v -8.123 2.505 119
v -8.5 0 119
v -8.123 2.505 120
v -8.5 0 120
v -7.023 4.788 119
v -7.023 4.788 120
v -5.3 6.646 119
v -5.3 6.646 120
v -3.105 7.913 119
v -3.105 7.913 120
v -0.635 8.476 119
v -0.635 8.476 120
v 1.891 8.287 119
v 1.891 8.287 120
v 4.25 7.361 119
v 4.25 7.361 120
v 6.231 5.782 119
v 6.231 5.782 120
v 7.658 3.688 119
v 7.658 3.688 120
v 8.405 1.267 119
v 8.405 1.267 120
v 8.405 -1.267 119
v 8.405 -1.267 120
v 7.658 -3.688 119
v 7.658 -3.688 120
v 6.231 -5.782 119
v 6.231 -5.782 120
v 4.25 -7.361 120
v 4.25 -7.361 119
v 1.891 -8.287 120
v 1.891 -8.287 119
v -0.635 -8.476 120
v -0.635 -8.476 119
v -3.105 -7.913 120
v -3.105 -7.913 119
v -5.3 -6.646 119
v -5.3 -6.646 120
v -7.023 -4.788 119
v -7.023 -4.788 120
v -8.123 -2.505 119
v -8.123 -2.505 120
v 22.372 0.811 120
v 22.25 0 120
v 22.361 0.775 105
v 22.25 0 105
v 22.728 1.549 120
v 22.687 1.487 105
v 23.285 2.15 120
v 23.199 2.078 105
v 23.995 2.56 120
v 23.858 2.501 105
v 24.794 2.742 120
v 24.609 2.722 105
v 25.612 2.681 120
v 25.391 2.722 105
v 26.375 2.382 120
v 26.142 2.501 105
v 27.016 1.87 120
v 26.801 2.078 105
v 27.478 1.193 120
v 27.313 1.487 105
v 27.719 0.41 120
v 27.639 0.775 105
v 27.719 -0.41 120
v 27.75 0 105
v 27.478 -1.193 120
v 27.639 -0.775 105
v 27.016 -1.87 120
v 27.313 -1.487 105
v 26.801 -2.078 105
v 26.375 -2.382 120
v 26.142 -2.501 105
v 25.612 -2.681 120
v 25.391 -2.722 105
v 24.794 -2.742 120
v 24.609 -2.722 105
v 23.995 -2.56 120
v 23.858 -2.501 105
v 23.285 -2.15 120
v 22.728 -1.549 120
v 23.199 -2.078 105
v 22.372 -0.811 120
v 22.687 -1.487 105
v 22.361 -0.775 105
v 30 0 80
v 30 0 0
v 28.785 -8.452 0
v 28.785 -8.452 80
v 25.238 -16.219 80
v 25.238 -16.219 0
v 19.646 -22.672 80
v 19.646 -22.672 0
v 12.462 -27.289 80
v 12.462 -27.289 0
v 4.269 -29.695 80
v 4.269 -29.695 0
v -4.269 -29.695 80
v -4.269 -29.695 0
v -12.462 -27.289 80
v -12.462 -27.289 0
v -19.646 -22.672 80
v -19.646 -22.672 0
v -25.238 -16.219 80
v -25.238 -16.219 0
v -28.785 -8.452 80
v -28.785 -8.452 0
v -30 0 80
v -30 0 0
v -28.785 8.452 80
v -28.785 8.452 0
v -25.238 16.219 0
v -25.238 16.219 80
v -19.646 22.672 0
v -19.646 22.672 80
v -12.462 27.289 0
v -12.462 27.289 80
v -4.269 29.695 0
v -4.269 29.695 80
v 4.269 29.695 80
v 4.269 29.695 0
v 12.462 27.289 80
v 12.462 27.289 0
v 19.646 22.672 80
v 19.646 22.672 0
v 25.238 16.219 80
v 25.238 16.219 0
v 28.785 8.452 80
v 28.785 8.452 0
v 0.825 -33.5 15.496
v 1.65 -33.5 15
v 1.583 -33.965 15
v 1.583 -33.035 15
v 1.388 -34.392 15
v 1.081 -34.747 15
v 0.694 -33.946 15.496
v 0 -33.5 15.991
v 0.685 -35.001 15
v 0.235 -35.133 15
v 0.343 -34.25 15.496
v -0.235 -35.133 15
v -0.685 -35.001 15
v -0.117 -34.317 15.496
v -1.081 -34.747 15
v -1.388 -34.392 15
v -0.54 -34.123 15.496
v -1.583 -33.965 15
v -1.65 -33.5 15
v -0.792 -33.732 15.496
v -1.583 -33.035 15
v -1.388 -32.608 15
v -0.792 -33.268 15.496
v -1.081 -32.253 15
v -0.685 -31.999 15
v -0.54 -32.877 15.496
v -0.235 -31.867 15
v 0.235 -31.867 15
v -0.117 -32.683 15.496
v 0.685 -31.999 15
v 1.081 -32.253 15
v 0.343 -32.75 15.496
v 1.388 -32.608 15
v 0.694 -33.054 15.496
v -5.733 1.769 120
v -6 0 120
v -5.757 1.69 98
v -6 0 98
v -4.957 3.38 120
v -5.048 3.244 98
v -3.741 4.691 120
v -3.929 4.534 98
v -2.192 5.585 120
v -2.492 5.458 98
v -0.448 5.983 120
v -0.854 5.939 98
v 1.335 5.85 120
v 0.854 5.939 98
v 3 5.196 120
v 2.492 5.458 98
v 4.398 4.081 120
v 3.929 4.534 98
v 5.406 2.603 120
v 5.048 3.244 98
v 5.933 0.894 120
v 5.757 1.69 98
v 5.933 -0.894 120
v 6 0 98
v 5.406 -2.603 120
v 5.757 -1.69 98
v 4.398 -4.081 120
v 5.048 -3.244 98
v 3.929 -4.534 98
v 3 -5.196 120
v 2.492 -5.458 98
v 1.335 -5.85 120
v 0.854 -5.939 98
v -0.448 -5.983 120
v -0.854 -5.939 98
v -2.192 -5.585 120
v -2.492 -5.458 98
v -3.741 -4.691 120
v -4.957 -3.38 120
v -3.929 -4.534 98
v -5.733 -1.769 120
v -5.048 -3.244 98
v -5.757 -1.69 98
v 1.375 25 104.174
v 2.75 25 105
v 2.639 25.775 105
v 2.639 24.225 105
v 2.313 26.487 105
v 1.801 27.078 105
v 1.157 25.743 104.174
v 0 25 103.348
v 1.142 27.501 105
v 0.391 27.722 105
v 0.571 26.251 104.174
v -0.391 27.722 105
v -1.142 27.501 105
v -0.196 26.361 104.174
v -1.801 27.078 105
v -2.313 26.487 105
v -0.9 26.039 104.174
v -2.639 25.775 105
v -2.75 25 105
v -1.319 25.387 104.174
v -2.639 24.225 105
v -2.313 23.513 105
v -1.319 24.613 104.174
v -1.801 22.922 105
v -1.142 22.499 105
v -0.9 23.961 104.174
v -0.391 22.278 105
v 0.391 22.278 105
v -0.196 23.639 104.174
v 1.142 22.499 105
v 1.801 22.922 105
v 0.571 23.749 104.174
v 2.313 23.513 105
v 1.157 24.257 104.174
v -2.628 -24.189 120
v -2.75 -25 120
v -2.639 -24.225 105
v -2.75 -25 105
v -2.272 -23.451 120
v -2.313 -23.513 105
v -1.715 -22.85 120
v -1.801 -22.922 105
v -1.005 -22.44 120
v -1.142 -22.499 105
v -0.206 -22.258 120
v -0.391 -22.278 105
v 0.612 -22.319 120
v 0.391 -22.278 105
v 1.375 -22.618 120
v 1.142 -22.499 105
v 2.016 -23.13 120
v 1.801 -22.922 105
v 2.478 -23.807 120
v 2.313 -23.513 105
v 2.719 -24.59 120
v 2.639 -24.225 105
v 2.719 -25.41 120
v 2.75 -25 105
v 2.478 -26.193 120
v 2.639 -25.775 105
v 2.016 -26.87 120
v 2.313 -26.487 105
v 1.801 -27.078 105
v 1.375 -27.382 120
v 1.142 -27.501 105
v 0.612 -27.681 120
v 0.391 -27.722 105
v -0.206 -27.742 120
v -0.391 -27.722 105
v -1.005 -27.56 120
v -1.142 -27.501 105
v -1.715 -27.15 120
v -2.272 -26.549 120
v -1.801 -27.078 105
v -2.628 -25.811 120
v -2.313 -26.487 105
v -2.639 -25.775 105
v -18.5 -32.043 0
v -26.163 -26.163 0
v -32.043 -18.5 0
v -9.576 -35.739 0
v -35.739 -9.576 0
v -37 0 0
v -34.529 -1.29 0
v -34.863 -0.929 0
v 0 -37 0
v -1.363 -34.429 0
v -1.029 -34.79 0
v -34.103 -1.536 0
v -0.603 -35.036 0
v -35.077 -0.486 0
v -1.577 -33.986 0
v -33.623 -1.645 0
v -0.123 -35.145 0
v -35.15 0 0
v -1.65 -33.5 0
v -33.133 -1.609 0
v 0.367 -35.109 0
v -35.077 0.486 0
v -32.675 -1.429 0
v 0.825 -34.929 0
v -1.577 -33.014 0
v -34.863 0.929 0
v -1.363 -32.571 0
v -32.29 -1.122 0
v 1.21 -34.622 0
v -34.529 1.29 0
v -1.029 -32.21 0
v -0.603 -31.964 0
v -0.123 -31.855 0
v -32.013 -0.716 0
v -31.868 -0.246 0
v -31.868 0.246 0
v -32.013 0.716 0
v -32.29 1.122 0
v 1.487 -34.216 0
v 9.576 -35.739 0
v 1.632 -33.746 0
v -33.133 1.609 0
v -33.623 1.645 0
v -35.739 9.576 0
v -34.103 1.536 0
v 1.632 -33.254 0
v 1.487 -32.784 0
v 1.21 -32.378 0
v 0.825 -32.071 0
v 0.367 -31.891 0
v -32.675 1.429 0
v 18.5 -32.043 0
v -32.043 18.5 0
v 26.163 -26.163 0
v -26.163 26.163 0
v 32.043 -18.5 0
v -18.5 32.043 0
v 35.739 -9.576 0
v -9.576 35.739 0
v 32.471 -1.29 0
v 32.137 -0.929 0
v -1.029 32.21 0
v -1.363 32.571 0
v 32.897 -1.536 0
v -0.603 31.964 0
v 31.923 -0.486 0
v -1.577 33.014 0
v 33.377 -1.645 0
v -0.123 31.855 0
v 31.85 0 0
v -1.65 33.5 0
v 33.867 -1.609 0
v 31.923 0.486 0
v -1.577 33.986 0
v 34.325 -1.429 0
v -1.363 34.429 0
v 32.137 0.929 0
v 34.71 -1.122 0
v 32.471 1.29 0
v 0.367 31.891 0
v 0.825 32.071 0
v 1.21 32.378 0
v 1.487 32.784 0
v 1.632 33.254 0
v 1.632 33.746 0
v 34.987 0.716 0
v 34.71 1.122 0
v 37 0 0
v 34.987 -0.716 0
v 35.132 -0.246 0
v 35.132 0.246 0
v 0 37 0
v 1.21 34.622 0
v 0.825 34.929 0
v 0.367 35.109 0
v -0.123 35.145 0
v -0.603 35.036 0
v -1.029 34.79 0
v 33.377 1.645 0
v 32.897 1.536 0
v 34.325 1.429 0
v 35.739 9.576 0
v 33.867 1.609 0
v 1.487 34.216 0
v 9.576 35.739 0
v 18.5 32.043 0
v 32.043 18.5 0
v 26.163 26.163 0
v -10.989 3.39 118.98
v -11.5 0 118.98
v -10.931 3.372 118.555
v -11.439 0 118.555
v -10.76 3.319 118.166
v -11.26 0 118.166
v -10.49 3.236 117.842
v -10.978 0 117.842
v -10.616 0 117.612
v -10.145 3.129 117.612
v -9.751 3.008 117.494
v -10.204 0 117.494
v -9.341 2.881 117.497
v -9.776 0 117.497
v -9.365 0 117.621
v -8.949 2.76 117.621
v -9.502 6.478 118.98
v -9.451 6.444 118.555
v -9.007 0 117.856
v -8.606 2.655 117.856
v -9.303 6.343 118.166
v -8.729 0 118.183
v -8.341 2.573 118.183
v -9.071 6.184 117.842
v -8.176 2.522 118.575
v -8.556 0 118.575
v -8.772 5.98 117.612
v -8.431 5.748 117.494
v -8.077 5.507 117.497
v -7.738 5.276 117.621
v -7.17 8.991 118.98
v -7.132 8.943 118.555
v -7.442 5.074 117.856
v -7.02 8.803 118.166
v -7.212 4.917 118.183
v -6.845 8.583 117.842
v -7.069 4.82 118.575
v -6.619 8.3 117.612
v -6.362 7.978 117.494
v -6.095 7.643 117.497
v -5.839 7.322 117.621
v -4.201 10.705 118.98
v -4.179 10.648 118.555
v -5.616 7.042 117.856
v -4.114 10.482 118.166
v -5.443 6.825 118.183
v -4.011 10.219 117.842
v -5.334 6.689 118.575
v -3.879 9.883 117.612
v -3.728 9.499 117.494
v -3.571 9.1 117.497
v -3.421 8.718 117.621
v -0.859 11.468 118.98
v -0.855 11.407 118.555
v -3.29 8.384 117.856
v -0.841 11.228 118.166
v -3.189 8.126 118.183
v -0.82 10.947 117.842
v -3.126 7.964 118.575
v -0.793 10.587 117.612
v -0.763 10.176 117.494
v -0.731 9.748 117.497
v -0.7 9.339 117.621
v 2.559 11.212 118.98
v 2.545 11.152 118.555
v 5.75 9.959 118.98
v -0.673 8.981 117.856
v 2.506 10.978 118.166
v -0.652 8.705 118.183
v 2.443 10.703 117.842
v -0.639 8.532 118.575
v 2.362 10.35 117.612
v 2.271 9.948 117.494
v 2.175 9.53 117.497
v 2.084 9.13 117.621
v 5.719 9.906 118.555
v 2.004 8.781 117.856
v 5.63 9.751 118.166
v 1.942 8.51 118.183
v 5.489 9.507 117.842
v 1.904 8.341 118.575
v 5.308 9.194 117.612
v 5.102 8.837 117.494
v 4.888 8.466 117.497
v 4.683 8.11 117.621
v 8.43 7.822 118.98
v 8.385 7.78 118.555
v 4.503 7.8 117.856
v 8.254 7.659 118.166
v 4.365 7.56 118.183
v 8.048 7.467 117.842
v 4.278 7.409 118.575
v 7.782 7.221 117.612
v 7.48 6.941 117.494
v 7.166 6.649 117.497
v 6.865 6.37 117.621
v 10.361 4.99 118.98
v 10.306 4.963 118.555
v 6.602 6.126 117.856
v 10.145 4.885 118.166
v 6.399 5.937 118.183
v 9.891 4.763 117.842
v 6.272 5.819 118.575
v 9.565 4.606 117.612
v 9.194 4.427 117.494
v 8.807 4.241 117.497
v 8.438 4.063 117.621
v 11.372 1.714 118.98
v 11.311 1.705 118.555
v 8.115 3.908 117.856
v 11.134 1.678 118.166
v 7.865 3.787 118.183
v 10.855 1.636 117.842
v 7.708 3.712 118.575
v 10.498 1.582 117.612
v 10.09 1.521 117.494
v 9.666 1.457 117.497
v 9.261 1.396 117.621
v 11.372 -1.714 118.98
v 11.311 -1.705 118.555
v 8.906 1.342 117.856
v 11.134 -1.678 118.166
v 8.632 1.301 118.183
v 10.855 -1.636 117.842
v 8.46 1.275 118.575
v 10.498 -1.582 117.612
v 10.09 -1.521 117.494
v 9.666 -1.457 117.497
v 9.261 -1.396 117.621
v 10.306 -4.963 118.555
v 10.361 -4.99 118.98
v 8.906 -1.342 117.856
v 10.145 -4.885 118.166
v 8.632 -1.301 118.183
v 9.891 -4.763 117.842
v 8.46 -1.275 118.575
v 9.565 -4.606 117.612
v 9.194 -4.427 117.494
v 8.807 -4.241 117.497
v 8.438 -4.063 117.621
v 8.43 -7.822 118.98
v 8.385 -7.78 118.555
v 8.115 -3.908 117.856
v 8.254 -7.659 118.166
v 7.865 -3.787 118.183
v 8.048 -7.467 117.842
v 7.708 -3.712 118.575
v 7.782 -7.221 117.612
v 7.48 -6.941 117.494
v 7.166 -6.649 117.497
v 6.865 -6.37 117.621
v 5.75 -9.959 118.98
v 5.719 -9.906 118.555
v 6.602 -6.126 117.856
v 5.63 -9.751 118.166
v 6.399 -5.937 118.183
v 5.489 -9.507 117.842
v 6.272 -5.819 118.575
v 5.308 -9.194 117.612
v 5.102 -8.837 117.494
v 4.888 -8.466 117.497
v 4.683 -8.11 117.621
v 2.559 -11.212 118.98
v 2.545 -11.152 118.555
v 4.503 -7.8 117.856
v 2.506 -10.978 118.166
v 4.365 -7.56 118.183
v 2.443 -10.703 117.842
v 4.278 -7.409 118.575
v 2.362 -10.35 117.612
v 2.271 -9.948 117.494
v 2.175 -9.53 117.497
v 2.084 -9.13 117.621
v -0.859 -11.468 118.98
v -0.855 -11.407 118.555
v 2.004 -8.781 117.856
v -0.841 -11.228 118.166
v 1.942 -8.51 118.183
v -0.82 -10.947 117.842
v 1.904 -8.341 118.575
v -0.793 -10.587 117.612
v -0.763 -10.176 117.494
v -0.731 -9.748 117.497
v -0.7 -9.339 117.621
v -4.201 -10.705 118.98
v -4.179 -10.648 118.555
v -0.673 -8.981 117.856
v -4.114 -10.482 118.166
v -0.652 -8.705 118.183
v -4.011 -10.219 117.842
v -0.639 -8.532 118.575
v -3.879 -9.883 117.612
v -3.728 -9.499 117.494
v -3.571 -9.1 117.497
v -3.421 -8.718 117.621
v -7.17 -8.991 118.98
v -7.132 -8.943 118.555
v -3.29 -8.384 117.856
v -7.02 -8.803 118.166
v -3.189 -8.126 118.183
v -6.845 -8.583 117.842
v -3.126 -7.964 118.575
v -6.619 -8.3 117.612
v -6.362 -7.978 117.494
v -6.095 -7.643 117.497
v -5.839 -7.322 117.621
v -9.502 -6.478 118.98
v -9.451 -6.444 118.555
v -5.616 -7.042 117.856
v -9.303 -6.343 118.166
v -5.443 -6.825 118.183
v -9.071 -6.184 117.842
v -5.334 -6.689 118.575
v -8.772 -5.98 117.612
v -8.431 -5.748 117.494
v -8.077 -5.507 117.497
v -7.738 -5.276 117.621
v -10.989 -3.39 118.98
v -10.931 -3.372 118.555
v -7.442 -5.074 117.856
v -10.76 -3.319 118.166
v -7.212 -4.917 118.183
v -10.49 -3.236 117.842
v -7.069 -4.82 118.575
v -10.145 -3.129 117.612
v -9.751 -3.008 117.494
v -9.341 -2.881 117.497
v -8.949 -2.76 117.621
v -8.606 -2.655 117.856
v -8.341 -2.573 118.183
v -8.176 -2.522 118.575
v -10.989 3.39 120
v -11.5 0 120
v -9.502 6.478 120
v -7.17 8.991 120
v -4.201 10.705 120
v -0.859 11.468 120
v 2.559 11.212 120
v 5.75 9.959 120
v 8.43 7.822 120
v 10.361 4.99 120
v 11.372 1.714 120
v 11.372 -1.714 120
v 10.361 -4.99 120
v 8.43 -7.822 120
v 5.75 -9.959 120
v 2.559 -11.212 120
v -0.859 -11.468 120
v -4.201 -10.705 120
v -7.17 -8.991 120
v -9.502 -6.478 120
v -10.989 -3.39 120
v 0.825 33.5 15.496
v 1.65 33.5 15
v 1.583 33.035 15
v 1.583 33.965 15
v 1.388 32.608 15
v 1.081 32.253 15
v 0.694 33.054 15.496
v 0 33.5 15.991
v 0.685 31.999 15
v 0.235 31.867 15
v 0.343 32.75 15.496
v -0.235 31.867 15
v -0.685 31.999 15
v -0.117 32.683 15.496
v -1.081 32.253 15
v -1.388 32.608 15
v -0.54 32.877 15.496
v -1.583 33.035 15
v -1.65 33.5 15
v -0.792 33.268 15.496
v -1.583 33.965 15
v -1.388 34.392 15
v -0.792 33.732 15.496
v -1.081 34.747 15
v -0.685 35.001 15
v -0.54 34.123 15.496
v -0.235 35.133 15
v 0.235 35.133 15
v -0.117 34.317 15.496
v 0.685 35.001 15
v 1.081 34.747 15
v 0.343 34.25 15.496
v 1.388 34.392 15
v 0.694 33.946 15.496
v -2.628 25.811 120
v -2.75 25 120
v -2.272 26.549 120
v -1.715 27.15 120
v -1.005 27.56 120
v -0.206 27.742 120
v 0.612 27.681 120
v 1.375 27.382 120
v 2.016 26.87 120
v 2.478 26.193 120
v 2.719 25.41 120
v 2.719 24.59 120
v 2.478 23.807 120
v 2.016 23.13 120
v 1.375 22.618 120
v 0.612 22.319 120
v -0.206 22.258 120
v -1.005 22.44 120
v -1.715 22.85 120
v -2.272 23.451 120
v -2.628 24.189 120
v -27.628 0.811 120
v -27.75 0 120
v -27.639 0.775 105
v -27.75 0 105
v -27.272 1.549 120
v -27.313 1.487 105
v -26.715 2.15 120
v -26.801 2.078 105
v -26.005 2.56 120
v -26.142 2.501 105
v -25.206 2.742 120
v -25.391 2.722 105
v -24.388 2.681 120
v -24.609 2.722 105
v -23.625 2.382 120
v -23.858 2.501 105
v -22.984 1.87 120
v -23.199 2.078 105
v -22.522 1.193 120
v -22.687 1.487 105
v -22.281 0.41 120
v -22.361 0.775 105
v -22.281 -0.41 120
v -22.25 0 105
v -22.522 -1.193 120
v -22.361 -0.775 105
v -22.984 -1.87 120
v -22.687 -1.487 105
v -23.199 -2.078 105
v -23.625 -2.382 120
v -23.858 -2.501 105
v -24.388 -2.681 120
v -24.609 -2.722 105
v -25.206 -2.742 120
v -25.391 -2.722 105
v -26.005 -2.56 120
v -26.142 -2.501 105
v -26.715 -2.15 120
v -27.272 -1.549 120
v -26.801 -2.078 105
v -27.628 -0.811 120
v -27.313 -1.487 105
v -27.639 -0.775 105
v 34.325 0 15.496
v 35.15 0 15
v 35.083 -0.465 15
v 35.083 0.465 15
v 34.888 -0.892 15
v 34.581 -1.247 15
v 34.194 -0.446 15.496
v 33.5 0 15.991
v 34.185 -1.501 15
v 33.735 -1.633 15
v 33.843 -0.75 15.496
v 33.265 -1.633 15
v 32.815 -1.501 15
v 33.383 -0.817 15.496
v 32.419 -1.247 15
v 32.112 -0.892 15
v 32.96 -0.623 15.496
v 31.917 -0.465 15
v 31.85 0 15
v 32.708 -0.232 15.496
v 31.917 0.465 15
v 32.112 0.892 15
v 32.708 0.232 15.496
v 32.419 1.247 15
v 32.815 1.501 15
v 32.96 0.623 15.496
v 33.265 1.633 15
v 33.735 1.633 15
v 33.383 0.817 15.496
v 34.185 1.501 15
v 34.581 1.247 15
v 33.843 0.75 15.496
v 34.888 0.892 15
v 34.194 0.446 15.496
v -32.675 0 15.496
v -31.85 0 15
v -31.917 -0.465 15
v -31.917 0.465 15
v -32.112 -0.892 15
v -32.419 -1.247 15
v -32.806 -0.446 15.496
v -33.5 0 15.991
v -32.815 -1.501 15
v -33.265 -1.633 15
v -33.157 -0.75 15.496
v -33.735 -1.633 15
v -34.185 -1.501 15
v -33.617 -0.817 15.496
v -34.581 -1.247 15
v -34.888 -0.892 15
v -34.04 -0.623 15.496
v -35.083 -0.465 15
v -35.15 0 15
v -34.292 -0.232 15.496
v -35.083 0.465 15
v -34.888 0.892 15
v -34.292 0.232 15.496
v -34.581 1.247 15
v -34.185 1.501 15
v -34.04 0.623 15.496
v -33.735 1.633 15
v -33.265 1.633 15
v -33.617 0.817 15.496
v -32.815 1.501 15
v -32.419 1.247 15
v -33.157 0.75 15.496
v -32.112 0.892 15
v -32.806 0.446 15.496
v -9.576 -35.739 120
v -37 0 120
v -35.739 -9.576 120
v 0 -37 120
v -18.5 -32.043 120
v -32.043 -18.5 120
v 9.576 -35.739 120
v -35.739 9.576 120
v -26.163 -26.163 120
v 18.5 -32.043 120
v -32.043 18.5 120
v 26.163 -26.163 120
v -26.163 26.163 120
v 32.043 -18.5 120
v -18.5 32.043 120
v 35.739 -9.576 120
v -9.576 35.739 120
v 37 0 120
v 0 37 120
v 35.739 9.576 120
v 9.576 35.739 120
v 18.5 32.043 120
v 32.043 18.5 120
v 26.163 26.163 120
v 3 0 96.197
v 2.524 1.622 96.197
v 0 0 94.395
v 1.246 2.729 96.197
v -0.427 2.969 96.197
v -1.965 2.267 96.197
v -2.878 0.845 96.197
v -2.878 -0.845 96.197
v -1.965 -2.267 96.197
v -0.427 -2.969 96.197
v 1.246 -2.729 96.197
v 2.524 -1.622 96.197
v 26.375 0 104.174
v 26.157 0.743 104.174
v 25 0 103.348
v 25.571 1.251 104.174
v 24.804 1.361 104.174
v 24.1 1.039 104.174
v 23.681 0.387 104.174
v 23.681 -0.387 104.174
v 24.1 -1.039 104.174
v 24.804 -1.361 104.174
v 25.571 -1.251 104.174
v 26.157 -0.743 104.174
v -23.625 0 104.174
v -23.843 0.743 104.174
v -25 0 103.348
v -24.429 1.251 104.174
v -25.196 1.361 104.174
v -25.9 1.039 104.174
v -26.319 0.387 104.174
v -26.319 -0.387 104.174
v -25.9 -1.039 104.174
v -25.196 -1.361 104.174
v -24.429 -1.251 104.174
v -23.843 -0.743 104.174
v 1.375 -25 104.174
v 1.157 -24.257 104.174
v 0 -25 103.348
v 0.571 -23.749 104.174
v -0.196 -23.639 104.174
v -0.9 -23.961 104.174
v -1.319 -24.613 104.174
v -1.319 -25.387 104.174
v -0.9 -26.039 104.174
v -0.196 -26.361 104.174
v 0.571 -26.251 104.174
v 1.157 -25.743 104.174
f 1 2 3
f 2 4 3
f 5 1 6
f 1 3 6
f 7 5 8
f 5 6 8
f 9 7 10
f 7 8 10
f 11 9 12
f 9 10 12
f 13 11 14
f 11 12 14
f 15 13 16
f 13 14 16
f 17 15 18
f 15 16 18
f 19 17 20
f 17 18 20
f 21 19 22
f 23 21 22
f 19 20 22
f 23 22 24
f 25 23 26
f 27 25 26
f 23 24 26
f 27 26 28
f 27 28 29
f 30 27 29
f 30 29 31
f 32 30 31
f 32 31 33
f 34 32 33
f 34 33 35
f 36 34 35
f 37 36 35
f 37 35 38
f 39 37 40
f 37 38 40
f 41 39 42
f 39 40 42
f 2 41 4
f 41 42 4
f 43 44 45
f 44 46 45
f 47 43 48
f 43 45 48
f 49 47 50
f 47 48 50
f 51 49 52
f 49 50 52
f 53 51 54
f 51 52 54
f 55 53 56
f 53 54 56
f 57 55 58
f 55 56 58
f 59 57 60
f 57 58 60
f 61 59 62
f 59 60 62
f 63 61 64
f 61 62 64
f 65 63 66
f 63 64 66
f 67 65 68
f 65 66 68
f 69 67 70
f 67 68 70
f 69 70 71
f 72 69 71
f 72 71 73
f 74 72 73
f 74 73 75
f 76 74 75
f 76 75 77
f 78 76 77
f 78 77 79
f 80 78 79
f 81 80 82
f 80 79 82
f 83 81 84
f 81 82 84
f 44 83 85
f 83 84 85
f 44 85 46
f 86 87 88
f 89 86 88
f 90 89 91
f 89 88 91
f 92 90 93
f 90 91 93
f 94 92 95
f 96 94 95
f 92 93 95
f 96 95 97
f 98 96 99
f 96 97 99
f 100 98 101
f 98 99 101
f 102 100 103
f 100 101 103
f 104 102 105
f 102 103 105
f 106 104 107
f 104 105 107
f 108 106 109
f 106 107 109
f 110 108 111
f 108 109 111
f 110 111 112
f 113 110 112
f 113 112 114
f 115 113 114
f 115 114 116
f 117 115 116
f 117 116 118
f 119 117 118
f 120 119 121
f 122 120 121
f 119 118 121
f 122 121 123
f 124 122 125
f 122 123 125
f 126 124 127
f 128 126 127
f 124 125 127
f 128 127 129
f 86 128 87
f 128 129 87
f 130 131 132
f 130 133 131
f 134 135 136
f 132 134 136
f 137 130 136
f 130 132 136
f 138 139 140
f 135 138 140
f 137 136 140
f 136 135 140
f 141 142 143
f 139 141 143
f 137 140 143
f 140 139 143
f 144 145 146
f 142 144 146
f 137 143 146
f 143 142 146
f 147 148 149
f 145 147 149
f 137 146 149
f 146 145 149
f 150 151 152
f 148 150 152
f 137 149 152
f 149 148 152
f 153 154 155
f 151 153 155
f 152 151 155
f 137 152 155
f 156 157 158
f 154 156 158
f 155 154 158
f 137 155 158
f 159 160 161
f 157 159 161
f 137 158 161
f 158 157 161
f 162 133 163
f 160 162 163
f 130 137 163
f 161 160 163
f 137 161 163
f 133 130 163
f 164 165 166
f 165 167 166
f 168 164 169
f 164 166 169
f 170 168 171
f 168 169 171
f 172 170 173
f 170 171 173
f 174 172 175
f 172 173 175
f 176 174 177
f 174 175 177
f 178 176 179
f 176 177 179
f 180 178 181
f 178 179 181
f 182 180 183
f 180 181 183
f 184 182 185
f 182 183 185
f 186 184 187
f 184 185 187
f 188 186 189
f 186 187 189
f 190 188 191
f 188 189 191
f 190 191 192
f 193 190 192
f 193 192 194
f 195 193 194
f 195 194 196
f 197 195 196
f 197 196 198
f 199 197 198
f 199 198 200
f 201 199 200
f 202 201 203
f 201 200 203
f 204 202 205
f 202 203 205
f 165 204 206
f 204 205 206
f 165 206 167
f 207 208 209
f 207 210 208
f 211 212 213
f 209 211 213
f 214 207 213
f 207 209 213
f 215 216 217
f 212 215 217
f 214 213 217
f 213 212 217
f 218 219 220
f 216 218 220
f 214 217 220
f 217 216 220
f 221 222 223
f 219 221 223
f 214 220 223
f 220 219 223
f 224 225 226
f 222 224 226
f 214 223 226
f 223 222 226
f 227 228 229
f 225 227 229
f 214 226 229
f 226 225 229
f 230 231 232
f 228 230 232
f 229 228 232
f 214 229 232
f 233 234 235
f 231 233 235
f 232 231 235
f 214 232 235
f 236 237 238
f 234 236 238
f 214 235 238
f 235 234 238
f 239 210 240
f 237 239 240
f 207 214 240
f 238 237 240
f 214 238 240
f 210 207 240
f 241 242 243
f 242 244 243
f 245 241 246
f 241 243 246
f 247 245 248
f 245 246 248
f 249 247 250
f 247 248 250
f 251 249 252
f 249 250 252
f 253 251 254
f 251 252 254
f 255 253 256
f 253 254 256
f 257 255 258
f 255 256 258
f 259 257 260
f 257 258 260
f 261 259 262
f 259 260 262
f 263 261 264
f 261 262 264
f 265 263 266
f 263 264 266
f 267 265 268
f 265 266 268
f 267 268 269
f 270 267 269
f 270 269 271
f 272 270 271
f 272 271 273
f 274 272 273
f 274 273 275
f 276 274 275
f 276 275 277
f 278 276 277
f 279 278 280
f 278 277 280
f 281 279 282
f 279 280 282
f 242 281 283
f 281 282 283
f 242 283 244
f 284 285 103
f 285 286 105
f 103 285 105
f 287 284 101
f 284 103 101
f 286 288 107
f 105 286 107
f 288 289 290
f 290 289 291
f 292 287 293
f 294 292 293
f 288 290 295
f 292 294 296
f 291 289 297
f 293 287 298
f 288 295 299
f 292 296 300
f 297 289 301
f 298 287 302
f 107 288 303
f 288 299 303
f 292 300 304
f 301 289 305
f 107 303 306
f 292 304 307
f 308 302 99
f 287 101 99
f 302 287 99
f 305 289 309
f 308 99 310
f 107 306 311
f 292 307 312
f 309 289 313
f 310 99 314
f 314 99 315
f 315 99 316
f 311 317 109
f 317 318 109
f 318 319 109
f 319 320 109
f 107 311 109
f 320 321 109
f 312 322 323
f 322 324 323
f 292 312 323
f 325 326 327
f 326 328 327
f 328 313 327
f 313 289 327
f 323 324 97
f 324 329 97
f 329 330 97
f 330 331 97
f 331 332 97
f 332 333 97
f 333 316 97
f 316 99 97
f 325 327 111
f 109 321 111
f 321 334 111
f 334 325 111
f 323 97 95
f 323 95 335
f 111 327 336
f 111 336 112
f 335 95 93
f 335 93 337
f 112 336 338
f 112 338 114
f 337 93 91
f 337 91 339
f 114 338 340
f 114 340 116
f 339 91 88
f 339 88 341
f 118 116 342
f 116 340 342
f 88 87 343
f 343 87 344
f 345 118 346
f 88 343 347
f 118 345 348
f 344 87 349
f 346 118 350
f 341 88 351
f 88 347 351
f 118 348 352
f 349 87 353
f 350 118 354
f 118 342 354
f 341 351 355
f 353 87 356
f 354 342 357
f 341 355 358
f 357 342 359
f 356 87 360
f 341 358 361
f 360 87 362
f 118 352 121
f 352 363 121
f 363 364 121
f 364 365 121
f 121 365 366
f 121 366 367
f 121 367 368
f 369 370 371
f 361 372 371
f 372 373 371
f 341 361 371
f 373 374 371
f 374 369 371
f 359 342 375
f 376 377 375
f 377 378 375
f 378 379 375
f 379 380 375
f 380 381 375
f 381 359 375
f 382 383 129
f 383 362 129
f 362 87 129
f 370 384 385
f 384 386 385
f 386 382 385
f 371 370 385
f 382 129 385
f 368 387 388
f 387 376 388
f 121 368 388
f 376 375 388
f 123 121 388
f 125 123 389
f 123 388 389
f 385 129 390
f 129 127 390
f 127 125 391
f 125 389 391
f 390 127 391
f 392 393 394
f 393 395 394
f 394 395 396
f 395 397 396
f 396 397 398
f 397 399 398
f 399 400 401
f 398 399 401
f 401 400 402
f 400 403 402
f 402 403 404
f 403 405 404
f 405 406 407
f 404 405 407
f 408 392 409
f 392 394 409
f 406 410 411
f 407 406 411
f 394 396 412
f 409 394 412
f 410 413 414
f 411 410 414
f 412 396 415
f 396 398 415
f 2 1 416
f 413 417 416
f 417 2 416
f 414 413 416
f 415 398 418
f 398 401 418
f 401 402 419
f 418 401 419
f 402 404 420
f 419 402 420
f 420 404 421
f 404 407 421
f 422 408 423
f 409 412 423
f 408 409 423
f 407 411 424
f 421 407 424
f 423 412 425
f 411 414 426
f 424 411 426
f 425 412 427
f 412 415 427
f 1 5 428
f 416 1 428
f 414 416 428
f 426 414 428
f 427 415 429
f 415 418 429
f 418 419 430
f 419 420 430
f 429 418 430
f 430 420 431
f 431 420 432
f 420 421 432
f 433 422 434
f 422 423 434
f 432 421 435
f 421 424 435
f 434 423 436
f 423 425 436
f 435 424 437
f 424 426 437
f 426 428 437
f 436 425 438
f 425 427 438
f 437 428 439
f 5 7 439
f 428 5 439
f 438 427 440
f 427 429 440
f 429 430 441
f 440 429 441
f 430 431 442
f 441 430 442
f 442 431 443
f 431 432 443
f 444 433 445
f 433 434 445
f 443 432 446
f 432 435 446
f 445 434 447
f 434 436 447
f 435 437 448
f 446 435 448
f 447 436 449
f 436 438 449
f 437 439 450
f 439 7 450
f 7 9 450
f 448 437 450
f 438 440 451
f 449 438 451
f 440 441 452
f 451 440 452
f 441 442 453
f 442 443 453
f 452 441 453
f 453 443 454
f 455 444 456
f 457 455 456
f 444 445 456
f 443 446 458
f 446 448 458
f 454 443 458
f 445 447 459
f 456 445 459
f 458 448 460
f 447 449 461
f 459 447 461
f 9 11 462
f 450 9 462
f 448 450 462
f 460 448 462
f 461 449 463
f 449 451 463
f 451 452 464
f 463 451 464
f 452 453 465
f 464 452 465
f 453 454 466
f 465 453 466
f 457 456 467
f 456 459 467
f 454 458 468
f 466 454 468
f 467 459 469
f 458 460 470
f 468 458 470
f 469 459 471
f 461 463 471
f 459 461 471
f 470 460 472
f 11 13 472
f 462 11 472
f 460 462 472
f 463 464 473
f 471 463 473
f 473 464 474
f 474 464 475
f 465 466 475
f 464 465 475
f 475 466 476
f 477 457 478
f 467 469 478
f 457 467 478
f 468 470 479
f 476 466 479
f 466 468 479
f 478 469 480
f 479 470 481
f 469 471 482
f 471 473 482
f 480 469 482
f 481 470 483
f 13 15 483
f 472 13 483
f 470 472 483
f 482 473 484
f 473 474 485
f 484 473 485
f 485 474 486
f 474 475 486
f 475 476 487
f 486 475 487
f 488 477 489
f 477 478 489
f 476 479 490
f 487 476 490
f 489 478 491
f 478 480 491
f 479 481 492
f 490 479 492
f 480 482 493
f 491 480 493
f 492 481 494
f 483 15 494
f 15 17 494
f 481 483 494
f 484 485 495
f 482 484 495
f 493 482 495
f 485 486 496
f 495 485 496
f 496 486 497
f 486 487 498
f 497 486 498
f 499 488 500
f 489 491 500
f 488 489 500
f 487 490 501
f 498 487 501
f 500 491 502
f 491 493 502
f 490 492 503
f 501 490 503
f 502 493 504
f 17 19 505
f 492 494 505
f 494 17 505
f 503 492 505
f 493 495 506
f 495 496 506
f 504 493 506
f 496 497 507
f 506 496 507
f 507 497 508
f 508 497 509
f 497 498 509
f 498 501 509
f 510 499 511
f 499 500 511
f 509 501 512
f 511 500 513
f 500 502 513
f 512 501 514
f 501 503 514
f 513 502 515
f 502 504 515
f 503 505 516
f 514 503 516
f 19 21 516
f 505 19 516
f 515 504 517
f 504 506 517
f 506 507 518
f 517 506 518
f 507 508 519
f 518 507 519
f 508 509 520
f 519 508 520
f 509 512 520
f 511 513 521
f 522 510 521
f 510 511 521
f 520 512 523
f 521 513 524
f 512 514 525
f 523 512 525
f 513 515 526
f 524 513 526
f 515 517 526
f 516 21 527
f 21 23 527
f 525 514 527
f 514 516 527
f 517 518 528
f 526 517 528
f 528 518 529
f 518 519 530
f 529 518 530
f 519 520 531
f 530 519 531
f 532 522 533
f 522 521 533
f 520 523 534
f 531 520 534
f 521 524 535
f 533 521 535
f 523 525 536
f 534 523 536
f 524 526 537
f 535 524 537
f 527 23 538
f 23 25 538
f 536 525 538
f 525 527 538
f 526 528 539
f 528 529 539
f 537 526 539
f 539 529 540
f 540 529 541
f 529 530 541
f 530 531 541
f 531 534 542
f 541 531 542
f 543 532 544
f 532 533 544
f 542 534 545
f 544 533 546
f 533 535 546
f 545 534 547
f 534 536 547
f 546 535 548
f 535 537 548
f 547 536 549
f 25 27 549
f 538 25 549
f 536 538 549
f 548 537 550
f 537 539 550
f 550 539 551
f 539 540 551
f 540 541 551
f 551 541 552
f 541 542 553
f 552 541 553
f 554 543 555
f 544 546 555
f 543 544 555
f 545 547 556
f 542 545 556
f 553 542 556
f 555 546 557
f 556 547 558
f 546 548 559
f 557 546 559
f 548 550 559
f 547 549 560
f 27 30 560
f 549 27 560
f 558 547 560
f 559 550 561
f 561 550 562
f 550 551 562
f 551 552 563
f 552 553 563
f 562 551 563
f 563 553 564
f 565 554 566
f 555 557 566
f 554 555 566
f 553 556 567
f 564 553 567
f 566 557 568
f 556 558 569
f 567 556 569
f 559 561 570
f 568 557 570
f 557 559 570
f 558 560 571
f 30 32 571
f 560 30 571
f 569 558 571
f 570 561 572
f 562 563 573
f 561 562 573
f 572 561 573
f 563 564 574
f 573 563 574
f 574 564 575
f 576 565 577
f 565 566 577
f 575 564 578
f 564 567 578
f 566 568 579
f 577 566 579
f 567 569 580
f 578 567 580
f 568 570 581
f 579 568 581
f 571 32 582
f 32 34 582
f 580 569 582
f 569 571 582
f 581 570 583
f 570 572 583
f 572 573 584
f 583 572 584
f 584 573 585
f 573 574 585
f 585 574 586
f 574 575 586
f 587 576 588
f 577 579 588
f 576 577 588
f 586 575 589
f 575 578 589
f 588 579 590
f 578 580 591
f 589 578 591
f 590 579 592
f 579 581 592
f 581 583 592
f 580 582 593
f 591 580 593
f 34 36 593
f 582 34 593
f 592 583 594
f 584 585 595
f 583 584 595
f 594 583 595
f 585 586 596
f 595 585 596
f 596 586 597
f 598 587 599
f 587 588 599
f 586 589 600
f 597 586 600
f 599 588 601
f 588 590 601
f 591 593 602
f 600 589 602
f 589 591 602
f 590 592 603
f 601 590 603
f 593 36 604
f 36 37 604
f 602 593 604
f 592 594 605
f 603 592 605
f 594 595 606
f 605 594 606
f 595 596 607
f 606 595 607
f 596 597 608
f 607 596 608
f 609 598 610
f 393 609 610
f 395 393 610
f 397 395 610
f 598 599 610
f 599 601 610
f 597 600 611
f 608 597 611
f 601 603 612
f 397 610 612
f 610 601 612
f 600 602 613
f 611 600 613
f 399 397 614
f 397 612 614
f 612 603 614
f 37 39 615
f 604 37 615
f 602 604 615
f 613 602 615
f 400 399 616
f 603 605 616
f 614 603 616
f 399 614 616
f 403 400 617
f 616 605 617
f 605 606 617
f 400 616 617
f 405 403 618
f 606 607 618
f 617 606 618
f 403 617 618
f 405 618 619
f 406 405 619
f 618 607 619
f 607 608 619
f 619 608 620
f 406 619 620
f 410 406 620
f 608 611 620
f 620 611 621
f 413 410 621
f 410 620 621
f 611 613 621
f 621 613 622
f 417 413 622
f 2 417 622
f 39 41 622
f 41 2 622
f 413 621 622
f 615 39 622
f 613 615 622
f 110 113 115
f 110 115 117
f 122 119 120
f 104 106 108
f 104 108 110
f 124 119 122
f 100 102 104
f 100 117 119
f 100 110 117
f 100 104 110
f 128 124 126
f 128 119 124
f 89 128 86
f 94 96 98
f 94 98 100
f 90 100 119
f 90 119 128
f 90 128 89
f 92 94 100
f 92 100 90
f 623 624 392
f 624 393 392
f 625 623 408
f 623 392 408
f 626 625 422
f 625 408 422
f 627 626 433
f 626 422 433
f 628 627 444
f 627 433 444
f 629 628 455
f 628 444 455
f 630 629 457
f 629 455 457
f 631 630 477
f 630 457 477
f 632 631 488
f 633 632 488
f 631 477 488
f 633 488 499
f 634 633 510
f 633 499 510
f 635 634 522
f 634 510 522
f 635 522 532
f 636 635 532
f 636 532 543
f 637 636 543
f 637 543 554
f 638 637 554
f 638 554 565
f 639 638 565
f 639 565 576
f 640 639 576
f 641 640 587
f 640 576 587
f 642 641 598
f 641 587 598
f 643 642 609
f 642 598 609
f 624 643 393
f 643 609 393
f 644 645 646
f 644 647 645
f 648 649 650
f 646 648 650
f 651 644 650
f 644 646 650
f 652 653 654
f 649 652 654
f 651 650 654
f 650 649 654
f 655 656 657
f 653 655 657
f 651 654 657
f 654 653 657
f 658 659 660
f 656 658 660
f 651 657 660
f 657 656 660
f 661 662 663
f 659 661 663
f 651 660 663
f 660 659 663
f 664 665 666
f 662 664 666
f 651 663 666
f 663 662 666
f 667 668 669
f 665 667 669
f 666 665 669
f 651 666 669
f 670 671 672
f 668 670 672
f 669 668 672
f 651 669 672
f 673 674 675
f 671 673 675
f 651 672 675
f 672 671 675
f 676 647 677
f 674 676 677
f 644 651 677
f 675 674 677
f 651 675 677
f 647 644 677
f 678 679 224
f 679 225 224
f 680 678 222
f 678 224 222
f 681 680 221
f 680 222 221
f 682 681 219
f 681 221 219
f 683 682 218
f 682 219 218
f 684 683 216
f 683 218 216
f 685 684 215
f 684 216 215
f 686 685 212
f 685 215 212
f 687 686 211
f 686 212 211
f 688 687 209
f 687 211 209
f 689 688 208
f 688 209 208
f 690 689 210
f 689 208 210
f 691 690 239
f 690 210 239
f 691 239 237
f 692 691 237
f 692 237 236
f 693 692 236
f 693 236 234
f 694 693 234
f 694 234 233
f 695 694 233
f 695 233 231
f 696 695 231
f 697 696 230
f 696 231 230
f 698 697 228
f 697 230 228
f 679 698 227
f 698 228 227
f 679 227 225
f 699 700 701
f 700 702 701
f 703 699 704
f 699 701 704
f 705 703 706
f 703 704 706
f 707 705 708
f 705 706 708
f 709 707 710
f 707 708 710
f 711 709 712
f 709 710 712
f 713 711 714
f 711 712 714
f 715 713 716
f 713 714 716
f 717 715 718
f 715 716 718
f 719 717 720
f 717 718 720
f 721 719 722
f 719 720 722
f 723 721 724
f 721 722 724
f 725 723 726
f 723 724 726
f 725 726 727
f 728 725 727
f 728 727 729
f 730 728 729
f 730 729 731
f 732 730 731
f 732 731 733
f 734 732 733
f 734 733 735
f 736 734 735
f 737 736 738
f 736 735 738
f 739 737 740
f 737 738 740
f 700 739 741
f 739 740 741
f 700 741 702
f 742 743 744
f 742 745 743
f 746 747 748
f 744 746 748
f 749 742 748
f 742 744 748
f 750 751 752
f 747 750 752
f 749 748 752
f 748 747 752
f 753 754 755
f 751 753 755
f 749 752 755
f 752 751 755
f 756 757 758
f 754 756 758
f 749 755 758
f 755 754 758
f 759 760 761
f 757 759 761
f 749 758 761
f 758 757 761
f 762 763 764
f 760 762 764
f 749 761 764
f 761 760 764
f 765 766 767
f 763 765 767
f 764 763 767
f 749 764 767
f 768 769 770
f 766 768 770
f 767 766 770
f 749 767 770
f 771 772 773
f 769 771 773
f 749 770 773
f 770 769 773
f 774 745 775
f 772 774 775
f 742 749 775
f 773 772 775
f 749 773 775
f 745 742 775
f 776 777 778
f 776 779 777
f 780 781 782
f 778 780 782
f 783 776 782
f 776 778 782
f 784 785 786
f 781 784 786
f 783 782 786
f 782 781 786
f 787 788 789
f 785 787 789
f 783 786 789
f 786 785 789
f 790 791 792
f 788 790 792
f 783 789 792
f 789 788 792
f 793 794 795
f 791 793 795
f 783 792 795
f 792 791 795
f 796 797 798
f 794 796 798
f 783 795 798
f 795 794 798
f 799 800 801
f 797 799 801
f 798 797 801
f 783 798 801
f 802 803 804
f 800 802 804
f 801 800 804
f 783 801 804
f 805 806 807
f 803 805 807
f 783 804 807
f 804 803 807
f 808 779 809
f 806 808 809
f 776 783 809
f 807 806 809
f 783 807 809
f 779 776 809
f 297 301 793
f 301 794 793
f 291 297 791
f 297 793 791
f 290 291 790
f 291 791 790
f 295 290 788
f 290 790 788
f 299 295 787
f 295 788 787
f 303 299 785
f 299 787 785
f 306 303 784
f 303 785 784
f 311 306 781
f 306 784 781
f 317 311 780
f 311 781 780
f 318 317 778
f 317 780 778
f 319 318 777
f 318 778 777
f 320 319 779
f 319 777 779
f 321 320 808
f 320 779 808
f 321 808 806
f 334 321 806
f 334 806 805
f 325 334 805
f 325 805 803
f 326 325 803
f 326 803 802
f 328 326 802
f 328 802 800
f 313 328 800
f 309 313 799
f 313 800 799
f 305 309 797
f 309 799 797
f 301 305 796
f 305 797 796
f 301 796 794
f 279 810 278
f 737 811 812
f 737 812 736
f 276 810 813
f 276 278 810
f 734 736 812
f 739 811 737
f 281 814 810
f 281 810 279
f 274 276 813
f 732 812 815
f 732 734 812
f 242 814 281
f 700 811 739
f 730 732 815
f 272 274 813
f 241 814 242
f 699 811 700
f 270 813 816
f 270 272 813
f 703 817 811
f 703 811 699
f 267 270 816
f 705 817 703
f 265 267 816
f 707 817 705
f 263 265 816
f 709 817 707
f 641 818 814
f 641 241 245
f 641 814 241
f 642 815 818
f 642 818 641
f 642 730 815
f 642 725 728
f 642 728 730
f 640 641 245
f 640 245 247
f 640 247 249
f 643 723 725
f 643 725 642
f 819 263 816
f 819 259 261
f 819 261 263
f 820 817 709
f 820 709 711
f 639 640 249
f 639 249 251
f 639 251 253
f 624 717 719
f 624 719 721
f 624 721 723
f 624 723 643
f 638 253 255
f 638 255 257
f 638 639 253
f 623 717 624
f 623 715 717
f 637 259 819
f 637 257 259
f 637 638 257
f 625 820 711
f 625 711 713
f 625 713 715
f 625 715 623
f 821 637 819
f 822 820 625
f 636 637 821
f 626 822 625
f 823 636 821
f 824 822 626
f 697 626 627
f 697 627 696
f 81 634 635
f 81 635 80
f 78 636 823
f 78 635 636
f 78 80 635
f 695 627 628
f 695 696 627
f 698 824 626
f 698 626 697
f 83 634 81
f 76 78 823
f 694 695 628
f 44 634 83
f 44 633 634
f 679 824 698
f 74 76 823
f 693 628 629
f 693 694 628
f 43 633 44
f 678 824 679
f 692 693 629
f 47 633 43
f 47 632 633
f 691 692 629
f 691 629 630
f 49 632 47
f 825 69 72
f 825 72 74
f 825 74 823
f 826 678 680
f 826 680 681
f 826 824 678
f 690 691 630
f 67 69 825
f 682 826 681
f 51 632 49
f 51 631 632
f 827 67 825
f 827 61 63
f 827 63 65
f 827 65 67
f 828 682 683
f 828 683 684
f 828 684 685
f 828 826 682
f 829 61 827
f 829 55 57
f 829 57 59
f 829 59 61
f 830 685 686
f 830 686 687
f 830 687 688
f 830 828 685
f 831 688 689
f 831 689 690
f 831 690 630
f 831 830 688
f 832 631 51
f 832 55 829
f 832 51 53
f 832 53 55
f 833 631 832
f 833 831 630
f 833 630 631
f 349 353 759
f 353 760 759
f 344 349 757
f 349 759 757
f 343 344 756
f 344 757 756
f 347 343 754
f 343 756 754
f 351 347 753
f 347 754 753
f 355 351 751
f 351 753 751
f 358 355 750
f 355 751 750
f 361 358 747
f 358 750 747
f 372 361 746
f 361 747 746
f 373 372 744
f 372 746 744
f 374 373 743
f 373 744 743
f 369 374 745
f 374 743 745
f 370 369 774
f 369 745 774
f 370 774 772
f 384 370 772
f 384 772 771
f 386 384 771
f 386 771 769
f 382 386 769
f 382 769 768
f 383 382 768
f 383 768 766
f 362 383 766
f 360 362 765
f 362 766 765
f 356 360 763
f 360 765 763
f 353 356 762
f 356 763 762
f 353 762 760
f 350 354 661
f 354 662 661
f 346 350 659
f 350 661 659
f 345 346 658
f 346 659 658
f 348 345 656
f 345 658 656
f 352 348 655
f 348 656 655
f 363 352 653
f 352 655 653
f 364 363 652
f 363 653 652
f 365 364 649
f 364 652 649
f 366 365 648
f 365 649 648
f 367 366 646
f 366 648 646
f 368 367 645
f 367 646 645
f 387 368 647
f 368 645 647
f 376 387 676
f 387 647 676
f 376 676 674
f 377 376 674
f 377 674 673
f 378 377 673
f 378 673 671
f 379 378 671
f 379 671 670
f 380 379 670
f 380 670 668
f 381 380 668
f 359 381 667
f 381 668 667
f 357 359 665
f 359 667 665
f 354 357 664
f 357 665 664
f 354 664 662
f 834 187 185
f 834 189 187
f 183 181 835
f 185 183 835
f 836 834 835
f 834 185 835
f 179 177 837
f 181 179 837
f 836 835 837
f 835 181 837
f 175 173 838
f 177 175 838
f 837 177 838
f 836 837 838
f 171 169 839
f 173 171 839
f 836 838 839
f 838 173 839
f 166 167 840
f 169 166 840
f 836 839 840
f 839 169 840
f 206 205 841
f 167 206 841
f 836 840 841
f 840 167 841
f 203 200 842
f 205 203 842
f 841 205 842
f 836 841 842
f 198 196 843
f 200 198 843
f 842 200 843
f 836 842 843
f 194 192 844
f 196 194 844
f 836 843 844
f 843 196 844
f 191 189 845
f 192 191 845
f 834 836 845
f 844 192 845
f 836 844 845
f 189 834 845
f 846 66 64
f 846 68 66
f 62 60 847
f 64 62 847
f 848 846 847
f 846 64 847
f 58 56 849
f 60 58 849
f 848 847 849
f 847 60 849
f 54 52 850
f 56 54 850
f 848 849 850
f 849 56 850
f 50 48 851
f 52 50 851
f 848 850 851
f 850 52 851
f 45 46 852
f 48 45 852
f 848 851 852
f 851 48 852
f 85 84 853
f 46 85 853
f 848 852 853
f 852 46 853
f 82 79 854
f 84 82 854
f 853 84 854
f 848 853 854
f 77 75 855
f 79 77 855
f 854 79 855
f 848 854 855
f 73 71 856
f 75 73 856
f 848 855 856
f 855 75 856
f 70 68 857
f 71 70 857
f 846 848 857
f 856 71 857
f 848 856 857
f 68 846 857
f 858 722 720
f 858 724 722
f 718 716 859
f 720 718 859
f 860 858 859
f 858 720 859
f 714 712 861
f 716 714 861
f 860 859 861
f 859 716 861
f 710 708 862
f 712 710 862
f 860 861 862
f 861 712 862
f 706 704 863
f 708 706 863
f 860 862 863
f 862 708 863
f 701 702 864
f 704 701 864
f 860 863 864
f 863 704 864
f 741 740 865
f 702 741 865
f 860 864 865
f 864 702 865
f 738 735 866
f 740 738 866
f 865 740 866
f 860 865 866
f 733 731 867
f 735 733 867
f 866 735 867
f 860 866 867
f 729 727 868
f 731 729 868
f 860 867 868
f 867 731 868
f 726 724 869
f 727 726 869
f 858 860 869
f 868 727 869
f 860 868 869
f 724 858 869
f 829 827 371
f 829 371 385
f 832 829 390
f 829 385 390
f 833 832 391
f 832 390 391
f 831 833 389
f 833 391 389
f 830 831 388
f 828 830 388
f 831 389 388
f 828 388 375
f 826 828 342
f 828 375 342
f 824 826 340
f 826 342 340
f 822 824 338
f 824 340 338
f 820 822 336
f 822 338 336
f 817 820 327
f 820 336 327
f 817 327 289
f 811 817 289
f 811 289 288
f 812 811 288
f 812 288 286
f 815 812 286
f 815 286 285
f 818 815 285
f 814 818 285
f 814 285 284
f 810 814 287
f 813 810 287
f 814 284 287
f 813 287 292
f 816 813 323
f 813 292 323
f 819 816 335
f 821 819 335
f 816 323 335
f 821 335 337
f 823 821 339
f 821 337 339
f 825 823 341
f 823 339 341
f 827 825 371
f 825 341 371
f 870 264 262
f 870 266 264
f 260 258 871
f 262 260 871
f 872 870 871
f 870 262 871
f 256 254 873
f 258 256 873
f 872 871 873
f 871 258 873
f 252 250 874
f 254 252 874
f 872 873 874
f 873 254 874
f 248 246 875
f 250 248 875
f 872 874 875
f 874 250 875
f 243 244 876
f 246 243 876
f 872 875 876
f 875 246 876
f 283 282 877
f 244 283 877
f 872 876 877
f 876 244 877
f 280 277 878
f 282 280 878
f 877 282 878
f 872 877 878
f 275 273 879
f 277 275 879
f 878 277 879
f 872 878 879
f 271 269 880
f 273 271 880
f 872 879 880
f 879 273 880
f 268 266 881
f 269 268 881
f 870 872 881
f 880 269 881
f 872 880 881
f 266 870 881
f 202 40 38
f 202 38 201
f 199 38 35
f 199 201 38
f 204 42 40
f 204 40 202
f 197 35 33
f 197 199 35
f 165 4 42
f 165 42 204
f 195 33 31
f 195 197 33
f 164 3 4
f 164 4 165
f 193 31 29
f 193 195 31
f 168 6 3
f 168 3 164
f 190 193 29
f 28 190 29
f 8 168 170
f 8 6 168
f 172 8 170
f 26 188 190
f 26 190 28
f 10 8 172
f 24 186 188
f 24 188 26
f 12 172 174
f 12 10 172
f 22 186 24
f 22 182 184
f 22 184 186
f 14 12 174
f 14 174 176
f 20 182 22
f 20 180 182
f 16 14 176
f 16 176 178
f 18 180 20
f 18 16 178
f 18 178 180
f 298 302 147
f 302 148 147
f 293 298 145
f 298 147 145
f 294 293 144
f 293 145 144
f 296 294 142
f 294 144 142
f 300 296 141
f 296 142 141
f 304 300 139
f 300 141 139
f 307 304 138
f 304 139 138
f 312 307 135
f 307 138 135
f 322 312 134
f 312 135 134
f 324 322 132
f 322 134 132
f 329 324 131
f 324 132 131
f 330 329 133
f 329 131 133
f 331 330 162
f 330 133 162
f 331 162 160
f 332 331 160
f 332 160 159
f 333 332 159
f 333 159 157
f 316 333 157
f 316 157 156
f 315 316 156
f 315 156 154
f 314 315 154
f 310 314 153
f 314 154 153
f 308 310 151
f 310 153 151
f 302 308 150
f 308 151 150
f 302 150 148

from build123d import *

# Parameters (mm, degrees)
F0_R      = 37
F1_DEPTH  = 120
F2_R      = 30
F3_DEPTH  = 80
F5_D      = 12
F5_DEPTH  = 22
F5_TIP    = 3.6051637142
F9_D      = 5.5
F9_DEPTH  = 15
F9_TIP    = 1.6523667023
F11_D     = 3.3
F11_DEPTH = 15
F11_TIP   = 0.9914200214


with BuildPart() as f1:
    # F0 (on Top) → F1 (new body)
    with BuildSketch(Plane.XY):
        Circle(F0_R)
    extrude(amount=F1_DEPTH)

    # F2 (on face) → F3 (cut)
    with BuildSketch(Plane(origin=(0, 0, 0), x_dir=(1, 0, 0), z_dir=(0, 0, -1))):
        Circle(F2_R)
    extrude(amount=-F3_DEPTH, mode=Mode.SUBTRACT)

    # F5
    with Locations(Plane.XY.offset(120)):
        with Locations((0, 0)):
            Hole(F5_D / 2, depth=F5_DEPTH)
            with Locations((0, 0, -(F5_DEPTH + F5_TIP / 2))):  # 118° drill point
                Cone(0, F5_D / 2, F5_TIP, mode=Mode.SUBTRACT)

    # F6 (on Front) → F7 (revolve, cut)
    with BuildSketch(Plane.XZ):
        with BuildLine():
            Line((-8.50013727, 120), (-11.5, 120))
            Line((-11.5, 120), (-11.5, 118.9797073603))
            ThreePointArc((-11.5, 118.9797073603), (-9.989853448, 117.4797416782), (-8.50013727, 119))
            Line((-8.50013727, 119), (-8.50013727, 120))
        make_face()
    revolve(axis=Axis((0, 0, 55.1168825477), (0, 0, -1)), mode=Mode.SUBTRACT)

    # F9
    with Locations(Plane.XY.offset(120)):
        with Locations((-25, 0), (0, 25), (25, 0), (0, -25)):
            Hole(F9_D / 2, depth=F9_DEPTH)
            with Locations((0, 0, -(F9_DEPTH + F9_TIP / 2))):  # 118° drill point
                Cone(0, F9_D / 2, F9_TIP, mode=Mode.SUBTRACT)

    # F11
    with Locations(Plane(origin=(0, 0, 0), x_dir=(1, 0, 0), z_dir=(0, 0, -1))):
        with Locations((-33.5, 0), (0, 33.5), (33.5, 0), (0, -33.5)):
            Hole(F11_D / 2, depth=F11_DEPTH)
            with Locations((0, 0, -(F11_DEPTH + F11_TIP / 2))):  # 118° drill point
                Cone(0, F11_D / 2, F11_TIP, mode=Mode.SUBTRACT)


solid = f1.part
